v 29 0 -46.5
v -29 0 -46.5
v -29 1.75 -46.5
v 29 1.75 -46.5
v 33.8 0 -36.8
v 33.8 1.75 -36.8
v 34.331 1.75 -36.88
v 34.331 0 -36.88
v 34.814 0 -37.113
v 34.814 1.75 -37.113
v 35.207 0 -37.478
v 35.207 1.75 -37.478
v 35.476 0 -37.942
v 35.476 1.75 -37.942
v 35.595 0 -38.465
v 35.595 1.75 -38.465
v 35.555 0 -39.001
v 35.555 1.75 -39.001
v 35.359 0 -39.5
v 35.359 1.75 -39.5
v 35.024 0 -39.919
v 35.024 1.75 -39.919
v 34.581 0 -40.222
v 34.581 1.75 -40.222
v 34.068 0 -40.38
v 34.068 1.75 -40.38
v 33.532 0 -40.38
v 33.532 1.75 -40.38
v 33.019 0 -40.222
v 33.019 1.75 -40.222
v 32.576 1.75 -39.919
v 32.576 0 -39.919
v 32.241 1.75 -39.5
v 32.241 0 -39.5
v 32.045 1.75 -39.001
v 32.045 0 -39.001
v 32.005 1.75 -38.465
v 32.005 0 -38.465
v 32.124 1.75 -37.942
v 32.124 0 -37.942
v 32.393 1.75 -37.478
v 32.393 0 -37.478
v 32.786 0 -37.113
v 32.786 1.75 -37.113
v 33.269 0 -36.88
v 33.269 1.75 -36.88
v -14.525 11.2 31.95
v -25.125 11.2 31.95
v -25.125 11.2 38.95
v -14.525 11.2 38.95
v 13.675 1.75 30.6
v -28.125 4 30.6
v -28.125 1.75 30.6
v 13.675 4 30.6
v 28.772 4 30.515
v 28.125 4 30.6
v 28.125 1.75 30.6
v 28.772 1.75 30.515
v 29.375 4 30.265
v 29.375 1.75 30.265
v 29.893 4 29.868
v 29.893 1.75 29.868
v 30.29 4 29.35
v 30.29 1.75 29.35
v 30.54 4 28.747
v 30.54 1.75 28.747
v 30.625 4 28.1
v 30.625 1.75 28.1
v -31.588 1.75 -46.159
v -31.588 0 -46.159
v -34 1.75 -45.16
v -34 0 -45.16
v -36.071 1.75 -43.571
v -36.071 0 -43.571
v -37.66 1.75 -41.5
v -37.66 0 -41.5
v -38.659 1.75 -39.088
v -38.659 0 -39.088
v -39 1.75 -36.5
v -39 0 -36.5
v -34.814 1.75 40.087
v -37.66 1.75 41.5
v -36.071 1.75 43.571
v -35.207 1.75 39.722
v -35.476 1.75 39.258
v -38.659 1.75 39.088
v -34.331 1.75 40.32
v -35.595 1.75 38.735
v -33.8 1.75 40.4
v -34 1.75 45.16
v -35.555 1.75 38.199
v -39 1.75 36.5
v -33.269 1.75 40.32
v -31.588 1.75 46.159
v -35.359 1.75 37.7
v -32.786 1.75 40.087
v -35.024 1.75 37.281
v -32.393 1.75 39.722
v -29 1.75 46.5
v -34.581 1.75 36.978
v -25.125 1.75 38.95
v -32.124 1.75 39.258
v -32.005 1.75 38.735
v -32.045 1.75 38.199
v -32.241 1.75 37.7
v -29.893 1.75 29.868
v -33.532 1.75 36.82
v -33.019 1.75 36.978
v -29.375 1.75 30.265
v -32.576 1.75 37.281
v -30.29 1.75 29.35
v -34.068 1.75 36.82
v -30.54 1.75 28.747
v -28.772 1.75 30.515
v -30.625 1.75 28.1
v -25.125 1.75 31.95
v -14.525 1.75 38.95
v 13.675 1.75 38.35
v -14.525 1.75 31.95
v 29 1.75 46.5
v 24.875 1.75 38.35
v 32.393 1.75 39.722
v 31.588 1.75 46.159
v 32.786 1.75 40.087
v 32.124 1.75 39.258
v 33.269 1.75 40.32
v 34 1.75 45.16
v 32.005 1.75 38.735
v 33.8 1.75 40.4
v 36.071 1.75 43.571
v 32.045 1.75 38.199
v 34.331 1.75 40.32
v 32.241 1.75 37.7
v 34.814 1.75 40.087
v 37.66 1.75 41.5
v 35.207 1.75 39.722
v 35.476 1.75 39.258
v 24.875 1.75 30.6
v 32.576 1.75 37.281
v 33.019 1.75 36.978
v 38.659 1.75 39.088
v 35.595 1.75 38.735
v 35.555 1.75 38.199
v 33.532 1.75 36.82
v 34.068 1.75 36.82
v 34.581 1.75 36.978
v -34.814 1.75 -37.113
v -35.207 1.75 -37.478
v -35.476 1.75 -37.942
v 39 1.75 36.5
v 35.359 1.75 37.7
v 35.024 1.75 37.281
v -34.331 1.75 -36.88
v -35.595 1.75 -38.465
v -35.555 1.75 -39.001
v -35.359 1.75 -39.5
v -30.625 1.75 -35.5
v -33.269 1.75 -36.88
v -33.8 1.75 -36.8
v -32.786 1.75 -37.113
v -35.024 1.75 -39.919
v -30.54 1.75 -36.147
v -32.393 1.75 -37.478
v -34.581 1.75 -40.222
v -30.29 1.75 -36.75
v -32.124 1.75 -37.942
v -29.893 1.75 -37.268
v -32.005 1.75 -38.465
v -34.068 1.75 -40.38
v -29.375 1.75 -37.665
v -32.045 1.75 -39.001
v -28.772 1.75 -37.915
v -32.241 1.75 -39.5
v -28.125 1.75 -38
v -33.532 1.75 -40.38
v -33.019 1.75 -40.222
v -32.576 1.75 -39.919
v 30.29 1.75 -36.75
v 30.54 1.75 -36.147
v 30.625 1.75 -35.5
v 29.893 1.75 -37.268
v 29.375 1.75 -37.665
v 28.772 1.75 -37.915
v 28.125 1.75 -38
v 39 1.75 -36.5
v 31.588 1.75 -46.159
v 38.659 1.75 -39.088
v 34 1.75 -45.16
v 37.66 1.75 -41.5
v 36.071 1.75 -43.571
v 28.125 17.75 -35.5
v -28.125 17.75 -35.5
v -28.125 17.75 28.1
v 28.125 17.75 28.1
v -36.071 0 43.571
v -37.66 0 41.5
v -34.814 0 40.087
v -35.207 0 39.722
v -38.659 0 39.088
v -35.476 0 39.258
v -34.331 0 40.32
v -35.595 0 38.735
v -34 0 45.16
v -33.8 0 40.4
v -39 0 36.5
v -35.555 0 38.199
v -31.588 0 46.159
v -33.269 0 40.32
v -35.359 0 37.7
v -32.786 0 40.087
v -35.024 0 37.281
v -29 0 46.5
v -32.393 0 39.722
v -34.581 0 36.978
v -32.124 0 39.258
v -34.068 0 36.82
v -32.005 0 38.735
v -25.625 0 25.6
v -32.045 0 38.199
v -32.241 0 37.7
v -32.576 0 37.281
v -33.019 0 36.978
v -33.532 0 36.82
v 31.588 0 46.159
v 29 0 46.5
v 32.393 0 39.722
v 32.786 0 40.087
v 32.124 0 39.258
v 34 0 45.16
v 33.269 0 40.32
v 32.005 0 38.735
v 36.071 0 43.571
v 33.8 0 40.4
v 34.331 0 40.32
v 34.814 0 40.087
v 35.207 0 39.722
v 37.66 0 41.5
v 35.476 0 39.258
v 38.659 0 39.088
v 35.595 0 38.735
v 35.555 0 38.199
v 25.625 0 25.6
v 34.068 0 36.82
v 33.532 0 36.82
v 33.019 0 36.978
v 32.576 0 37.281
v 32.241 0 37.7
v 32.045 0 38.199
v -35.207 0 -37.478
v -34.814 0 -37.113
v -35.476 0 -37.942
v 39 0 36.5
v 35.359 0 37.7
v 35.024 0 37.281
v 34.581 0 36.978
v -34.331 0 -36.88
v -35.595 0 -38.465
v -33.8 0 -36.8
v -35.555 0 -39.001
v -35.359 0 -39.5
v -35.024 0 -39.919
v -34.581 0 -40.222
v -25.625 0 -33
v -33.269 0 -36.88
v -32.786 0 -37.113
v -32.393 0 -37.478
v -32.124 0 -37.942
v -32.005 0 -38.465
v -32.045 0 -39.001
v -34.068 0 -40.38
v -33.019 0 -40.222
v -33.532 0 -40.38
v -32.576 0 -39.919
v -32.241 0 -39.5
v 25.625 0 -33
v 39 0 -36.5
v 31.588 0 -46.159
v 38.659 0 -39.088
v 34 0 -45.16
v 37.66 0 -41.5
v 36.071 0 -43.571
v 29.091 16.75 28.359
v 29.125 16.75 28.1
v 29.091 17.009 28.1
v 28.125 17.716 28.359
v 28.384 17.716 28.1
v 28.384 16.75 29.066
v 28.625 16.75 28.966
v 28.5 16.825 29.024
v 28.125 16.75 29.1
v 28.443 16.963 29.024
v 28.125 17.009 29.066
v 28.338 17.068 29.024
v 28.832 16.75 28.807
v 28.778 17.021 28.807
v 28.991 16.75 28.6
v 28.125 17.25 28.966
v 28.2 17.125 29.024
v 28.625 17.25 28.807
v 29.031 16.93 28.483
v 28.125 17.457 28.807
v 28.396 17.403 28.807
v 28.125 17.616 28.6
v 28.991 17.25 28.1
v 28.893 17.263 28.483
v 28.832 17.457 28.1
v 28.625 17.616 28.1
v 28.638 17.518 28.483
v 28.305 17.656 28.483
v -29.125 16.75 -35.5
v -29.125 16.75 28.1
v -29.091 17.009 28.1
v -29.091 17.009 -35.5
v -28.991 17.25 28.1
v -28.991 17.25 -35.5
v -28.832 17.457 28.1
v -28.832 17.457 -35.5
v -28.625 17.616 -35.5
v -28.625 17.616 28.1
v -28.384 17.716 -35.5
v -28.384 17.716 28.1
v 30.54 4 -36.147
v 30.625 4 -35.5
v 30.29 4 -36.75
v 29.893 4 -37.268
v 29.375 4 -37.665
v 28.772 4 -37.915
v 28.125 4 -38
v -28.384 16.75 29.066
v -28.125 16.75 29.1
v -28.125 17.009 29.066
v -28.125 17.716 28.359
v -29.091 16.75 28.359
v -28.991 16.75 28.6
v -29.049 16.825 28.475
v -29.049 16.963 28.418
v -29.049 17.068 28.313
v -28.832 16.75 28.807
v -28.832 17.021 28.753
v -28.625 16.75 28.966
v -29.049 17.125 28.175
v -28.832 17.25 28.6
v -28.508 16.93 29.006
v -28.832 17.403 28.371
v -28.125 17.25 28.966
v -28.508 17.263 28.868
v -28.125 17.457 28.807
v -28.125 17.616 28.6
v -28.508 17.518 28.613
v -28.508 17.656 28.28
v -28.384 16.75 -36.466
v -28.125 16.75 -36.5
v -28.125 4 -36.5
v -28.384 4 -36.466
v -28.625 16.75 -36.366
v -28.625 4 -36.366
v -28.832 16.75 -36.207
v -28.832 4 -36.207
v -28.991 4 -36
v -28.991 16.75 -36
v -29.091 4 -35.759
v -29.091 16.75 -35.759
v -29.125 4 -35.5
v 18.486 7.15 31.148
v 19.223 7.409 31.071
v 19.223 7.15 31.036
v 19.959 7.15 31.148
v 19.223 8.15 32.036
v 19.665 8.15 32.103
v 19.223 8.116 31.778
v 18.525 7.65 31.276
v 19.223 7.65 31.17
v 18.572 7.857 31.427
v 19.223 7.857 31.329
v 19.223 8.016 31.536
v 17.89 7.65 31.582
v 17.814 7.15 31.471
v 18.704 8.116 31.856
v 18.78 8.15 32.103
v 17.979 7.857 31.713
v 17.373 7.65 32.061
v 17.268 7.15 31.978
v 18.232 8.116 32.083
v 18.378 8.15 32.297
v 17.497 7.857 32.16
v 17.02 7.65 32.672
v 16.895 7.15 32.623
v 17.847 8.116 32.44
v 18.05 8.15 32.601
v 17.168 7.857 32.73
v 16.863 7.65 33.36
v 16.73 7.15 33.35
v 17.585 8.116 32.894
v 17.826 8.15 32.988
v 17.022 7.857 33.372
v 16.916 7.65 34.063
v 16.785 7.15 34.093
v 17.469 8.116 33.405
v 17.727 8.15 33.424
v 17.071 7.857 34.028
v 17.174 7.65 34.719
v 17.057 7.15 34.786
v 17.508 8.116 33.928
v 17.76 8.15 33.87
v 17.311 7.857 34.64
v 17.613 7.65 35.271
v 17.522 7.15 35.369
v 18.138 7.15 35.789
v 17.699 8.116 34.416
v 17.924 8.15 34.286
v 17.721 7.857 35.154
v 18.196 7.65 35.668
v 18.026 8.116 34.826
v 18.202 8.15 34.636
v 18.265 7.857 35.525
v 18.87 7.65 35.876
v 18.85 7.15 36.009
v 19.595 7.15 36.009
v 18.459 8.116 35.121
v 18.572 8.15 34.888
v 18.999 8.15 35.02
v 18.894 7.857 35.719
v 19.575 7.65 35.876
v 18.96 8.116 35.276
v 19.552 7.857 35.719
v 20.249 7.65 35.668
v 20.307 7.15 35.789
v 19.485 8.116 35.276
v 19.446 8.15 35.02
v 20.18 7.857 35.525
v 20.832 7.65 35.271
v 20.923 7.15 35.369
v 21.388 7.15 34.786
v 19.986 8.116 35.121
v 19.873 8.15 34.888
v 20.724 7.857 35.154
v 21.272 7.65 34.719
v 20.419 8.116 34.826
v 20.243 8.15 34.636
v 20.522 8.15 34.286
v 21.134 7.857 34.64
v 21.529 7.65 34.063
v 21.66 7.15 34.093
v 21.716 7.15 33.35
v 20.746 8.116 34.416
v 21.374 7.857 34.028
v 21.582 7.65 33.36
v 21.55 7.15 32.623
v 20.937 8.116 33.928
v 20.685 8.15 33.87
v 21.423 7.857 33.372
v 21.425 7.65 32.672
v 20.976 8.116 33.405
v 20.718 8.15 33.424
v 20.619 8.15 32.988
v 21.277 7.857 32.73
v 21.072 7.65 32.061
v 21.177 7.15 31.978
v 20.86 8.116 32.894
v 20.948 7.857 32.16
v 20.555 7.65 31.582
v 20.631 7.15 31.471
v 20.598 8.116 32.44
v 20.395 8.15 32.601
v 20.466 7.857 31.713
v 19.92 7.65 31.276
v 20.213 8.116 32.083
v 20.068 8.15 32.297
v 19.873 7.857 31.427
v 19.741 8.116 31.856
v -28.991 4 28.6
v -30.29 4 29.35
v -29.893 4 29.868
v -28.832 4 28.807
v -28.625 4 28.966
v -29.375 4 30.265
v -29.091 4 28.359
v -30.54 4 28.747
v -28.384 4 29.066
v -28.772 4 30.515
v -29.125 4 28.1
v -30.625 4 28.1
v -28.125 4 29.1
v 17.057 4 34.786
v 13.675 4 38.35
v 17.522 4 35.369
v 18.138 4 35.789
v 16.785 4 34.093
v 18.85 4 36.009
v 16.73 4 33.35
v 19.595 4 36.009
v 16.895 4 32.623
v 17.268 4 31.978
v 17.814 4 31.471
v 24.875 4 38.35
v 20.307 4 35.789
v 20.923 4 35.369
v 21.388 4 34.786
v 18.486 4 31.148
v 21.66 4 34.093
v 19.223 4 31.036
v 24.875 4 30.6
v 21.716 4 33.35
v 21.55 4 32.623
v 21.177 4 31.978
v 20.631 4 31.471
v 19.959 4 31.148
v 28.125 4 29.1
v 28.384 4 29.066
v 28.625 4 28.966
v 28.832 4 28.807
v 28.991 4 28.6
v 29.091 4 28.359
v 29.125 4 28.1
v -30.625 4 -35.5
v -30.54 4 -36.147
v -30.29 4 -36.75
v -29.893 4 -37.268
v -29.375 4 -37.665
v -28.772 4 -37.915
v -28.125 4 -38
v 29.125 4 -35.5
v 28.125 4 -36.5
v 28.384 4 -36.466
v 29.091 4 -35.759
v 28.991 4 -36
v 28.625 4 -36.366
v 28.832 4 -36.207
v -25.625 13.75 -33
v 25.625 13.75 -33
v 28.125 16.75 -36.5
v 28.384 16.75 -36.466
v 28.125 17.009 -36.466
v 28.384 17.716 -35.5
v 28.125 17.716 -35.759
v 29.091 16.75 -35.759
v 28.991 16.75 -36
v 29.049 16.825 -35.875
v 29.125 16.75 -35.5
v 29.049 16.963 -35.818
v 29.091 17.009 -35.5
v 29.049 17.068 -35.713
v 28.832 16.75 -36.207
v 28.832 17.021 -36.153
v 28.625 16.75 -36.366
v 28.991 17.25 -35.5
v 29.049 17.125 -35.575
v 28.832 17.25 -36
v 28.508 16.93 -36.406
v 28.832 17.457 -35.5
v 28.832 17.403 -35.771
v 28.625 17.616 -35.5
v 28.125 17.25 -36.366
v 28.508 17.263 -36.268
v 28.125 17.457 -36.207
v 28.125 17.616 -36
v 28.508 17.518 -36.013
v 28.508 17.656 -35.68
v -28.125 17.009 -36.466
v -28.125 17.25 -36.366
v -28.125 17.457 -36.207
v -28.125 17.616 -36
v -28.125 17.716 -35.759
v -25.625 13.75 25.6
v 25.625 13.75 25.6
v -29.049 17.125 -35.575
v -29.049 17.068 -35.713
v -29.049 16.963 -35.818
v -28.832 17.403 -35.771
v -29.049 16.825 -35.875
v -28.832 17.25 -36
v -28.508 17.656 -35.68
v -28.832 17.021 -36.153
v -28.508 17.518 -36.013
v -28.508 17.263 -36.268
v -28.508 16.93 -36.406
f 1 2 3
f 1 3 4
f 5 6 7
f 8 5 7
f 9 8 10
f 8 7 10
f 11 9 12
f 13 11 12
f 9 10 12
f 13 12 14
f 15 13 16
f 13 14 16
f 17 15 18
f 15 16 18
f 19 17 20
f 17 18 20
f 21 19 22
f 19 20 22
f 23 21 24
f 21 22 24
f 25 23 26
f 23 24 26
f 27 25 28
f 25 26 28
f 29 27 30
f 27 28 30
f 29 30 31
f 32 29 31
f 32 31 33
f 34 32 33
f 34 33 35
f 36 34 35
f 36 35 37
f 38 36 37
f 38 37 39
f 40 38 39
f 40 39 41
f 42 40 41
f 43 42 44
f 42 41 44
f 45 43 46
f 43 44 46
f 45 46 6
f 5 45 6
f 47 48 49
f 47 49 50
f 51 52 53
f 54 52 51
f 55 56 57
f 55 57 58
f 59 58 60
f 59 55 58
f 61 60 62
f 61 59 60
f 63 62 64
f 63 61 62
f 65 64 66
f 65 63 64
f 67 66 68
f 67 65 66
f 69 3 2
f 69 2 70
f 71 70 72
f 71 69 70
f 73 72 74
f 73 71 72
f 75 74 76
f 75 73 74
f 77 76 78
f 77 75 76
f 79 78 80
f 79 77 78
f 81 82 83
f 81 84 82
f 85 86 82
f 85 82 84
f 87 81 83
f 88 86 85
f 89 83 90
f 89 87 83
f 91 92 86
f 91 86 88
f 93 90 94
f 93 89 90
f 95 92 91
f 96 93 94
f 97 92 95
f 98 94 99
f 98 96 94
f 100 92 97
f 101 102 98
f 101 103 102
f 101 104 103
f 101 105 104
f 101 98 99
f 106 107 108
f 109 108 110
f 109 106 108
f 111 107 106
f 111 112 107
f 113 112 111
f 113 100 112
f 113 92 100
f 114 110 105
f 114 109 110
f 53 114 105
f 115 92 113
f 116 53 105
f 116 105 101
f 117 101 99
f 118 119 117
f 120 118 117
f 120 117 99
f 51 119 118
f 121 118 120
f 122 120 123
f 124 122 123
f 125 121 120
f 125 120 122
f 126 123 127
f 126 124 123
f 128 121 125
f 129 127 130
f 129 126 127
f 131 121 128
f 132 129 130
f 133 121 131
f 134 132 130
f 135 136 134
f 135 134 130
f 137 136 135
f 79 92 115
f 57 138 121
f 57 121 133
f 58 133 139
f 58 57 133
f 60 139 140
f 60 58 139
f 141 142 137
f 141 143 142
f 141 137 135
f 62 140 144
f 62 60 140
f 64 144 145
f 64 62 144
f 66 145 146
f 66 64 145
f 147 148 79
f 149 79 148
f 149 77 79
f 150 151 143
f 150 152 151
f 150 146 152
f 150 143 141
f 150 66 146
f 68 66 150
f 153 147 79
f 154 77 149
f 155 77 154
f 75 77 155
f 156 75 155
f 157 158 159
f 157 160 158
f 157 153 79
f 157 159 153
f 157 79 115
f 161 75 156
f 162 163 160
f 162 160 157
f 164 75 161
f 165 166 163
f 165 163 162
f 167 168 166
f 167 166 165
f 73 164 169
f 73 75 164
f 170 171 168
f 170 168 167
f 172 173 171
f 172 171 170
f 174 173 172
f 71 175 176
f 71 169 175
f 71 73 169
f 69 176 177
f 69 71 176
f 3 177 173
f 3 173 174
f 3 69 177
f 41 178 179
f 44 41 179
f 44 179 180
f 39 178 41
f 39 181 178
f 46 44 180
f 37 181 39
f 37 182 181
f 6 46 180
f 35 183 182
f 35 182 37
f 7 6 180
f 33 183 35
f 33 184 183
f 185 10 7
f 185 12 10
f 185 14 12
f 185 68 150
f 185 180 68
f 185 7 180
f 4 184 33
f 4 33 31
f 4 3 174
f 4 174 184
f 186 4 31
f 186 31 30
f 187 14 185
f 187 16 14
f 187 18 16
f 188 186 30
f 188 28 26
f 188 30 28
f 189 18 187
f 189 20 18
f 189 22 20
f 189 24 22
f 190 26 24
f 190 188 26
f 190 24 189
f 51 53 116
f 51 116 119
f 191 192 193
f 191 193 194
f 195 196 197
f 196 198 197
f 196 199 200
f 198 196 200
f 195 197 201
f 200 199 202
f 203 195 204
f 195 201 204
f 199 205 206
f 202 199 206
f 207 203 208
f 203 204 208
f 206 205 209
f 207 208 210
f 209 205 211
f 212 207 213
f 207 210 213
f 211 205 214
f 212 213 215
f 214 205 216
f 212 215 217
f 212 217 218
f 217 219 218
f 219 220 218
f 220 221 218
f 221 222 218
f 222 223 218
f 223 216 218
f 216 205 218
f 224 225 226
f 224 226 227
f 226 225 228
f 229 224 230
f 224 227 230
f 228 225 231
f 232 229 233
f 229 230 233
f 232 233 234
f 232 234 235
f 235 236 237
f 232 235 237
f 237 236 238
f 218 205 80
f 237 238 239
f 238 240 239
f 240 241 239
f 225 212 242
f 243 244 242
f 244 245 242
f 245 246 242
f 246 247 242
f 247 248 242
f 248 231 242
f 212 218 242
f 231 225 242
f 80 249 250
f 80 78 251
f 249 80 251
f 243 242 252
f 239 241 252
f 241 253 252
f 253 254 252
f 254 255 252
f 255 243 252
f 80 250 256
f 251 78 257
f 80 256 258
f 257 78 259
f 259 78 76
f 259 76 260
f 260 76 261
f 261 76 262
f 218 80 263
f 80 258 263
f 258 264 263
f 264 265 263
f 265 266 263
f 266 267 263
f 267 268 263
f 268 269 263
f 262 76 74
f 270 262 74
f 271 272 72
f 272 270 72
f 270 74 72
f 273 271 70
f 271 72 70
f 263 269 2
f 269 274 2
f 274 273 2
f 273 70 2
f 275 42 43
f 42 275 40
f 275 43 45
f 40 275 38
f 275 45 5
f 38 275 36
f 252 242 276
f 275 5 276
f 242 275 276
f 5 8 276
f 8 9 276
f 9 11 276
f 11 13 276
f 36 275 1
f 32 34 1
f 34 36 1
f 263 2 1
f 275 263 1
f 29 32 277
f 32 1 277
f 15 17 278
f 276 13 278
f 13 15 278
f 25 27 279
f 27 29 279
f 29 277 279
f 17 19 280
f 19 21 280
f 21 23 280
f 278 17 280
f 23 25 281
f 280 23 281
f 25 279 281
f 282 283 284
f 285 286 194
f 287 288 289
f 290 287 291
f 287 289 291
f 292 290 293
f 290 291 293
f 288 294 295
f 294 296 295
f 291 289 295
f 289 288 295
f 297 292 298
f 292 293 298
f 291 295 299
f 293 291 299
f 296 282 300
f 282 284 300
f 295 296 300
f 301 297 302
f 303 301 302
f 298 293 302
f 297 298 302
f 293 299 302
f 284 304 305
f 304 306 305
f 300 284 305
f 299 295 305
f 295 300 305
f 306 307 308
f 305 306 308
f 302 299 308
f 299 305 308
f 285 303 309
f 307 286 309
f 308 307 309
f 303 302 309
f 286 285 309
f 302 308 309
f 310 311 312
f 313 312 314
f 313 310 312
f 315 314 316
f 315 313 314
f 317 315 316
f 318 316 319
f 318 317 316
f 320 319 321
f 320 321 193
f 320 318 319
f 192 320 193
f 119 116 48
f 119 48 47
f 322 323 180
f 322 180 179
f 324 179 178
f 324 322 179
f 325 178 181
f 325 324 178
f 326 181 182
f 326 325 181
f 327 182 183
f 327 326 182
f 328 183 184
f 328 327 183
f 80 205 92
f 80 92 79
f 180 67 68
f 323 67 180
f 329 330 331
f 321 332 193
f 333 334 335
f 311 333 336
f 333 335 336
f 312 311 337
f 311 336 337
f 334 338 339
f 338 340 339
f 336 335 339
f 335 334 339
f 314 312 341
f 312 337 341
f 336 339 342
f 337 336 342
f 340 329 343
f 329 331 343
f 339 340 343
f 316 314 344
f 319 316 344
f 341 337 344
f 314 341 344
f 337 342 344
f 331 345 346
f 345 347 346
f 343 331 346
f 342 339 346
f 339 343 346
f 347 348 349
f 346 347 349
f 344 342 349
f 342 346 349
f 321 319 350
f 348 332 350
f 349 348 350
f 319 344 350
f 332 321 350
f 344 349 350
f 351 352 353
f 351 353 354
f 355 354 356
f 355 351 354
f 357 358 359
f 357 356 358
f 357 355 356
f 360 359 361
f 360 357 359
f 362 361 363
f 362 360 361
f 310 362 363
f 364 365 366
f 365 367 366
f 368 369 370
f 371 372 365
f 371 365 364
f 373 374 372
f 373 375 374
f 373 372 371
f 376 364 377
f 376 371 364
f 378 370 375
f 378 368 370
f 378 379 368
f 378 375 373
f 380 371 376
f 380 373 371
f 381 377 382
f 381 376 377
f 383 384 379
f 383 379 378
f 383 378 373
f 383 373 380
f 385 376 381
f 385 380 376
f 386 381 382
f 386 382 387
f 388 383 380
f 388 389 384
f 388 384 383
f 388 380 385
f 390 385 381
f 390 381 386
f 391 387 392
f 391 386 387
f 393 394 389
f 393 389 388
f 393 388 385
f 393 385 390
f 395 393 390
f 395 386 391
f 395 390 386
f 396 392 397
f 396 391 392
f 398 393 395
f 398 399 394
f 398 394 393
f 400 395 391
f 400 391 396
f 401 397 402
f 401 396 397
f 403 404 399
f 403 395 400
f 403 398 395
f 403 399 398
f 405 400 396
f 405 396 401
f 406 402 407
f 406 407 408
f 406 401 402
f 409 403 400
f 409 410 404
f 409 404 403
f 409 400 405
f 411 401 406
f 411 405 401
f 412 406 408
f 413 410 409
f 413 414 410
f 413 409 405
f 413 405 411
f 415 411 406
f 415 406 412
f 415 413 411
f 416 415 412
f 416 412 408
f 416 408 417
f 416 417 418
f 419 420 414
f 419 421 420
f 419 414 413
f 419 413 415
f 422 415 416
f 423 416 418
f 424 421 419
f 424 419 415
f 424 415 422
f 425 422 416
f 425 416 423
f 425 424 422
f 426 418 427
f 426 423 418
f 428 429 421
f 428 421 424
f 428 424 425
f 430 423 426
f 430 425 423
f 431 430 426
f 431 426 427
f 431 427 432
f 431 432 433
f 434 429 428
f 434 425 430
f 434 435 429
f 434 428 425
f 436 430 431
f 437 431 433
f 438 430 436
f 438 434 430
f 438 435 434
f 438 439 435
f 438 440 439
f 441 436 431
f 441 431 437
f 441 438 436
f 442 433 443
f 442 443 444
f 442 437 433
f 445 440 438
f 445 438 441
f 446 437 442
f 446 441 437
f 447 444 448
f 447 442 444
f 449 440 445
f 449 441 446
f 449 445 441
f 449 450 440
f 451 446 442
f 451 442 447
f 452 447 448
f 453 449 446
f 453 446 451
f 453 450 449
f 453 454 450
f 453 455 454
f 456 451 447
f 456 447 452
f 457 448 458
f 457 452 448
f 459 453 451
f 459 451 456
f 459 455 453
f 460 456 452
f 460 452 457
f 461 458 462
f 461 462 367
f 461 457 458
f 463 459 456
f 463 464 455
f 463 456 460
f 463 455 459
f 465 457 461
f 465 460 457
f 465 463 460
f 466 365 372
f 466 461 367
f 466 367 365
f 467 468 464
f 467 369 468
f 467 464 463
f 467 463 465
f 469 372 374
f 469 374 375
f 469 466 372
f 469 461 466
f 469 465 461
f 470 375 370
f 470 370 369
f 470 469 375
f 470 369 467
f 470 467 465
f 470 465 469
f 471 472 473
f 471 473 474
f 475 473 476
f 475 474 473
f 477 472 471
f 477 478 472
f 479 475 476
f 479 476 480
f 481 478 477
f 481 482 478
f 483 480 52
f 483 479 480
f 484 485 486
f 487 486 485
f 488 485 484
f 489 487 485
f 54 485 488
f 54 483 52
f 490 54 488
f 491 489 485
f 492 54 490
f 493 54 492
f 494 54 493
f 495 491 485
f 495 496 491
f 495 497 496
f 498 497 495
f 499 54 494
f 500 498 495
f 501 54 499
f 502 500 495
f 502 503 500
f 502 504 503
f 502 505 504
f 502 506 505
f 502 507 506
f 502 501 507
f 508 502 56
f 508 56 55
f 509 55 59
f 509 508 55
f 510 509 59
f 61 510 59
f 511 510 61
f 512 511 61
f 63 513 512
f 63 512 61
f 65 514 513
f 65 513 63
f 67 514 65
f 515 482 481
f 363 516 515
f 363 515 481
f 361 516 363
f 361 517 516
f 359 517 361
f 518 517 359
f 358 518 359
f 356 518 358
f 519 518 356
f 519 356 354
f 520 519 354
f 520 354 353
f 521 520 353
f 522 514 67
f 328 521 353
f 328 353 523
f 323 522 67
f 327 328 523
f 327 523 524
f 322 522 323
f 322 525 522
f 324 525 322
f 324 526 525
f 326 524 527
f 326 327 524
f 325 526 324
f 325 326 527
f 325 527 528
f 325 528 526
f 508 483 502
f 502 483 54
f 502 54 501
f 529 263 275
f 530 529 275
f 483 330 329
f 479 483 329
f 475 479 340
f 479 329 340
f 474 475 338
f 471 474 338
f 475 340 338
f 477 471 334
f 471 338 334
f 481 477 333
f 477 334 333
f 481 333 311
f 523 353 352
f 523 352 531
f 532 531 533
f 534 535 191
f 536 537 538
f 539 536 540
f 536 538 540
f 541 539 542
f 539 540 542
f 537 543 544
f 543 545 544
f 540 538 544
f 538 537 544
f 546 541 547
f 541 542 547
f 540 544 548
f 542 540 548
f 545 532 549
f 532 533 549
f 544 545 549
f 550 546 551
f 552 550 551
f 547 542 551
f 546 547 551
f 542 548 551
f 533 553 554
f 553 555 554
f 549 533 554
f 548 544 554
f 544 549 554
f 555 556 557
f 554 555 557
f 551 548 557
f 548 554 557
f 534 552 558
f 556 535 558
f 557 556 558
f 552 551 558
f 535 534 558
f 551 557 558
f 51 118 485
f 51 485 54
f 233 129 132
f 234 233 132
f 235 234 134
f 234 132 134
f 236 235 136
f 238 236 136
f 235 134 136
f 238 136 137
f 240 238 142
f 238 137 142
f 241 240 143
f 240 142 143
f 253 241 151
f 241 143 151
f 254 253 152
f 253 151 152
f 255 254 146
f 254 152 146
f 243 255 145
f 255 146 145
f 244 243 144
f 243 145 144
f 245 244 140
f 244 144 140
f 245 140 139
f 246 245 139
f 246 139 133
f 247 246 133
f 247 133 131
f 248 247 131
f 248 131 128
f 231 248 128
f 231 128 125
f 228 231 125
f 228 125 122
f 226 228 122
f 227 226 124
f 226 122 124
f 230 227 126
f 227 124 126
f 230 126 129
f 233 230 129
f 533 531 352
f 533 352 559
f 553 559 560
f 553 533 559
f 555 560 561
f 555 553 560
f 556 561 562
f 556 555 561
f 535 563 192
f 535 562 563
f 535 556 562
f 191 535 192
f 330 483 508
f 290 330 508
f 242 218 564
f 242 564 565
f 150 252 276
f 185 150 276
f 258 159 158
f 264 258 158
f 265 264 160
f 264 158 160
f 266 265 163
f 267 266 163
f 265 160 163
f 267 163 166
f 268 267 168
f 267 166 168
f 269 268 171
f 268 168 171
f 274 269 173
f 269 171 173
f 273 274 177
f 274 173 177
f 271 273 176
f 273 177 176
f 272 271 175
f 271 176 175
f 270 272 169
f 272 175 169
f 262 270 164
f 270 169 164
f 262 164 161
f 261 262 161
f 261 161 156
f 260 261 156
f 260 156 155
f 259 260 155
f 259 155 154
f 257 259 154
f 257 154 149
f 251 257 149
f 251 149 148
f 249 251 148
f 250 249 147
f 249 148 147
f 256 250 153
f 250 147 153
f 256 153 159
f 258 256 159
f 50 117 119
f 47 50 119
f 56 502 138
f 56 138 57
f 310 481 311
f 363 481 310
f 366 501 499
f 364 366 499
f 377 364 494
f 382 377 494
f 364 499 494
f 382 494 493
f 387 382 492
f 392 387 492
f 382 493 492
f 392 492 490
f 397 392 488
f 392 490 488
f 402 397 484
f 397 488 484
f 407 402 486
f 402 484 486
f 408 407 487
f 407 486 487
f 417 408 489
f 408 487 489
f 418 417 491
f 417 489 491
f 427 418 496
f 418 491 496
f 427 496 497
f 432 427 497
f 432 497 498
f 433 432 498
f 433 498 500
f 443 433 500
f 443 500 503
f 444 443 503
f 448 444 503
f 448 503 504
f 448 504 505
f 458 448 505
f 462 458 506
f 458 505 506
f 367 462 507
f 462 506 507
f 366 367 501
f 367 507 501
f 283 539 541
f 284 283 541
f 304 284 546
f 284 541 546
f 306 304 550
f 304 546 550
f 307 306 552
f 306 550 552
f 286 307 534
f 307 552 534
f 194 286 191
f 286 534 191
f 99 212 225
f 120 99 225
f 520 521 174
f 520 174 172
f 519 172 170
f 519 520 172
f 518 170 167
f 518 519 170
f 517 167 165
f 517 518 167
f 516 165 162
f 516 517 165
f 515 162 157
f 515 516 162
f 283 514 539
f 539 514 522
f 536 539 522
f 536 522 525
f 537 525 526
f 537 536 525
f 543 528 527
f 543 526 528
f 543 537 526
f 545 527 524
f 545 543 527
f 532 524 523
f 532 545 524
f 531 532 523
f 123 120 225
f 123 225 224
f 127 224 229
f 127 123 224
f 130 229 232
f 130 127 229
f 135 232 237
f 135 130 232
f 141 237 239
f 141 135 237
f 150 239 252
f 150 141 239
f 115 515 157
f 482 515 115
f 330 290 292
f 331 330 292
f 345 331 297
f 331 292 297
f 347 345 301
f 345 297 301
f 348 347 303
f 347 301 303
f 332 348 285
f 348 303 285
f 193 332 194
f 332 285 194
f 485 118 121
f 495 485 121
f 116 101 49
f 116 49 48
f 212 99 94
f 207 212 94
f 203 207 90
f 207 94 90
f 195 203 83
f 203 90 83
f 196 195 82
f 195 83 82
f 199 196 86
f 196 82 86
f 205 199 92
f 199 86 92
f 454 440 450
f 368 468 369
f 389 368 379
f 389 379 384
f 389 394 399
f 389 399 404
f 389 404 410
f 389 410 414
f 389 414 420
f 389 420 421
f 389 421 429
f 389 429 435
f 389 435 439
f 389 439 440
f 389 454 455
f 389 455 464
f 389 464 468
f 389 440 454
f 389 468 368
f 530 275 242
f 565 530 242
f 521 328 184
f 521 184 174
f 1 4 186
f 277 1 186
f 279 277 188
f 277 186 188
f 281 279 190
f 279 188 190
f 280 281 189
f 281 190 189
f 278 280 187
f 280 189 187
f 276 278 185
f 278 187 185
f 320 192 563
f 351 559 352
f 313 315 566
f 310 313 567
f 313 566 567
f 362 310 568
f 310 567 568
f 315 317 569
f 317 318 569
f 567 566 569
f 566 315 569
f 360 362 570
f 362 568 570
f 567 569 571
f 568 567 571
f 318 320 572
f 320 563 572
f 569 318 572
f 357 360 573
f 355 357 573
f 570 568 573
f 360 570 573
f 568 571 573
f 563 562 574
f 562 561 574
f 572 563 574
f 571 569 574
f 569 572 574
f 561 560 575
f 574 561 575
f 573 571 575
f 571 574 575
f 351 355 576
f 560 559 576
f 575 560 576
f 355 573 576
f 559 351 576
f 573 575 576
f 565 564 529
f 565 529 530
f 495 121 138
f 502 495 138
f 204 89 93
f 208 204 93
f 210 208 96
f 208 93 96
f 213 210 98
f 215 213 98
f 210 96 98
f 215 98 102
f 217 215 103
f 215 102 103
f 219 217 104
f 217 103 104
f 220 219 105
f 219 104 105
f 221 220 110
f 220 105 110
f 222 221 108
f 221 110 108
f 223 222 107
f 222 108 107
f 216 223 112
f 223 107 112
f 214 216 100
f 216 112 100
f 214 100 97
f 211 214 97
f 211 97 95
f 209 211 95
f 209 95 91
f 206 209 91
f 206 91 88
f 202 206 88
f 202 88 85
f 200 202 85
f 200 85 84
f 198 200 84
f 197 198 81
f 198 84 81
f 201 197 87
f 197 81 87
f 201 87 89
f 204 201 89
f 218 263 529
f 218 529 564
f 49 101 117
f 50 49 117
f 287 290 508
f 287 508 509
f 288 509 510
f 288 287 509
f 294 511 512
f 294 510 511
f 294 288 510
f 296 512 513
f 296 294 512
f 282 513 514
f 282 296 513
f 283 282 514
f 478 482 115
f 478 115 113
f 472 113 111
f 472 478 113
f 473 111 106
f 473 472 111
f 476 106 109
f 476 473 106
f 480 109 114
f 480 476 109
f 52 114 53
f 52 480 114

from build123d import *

# Parameters (mm, degrees)
SKETCH1_W           = 78
SKETCH1_H           = 93
BOSS_EXTRUDE1_DEPTH = 1.75
SKETCH2_R           = 1.8
CUT_EXTRUDE1_DEPTH  = 1.75
SKETCH3_W           = 58.25
SKETCH3_H           = 65.6
BOSS_EXTRUDE2_DEPTH = 16
FILLET1_R           = 1
SKETCH4_W           = 10.6
SKETCH4_H           = 7
BOSS_EXTRUDE3_DEPTH = 9.45
BOSS_EXTRUDE4_START = 2.25
BOSS_EXTRUDE4_DEPTH = 2.25
SKETCH6_W           = 11.2
SKETCH6_H           = 7.75
BOSS_EXTRUDE5_DEPTH = 2.25
SKETCH7_W           = 51.25
SKETCH7_H           = 58.6
CUT_EXTRUDE2_DEPTH  = 13.75
SKETCH8_R           = 2.5
BOSS_EXTRUDE6_DEPTH = 4.15
FILLET2_R           = 1


with BuildPart() as part:
    # Sketch1 → Boss-Extrude1 (new body)
    with BuildSketch(Plane(origin=(0, 0, 0), x_dir=(1, 0, 0), z_dir=(0, 1, 0))):
        Rectangle(SKETCH1_W, SKETCH1_H)
    extrude(amount=BOSS_EXTRUDE1_DEPTH)

    # Sketch2 → Cut-Extrude1 (cut)
    with BuildSketch(Plane(origin=(0, 1.75, 0), x_dir=(1, 0, 0), z_dir=(0, 1, 0))):
        with Locations(Location((-33.8, 38.6, 0), (0, 0, 270))):
            Circle(SKETCH2_R)
        with Locations(Location((33.8, 38.6, 0), (0, 0, 270))):
            Circle(SKETCH2_R)
        with Locations(Location((33.8, -38.6, 0), (0, 0, 270))):
            Circle(SKETCH2_R)
        with Locations(Location((-33.8, -38.6, 0), (0, 0, 270))):
            Circle(SKETCH2_R)
        with BuildLine():
            Line((-39, 36.5), (-39, 46.5))
            Line((-39, 46.5), (-29, 46.5))
            ThreePointArc((-29, 46.5), (-36.071067812, 43.571067812), (-39, 36.5))
        make_face()
        with BuildLine():
            Line((39, 36.5), (39, 46.5))
            Line((39, 46.5), (29, 46.5))
            ThreePointArc((29, 46.5), (36.071067812, 43.571067812), (39, 36.5))
        make_face()
        with BuildLine():
            Line((39, -36.5), (39, -46.5))
            Line((39, -46.5), (29, -46.5))
            ThreePointArc((29, -46.5), (36.071067812, -43.571067812), (39, -36.5))
        make_face()
        with BuildLine():
            Line((-39, -36.5), (-39, -46.5))
            Line((-39, -46.5), (-29, -46.5))
            ThreePointArc((-29, -46.5), (-36.071067812, -43.571067812), (-39, -36.5))
        make_face()
    extrude(amount=-CUT_EXTRUDE1_DEPTH, mode=Mode.SUBTRACT)

    # Sketch3 → Boss-Extrude2 (add)
    with BuildSketch(Plane(origin=(0, 1.75, 0), x_dir=(1, 0, 0), z_dir=(0, 1, 0))):
        with Locations((0, 3.7)):
            Rectangle(SKETCH3_W, SKETCH3_H)
    extrude(amount=BOSS_EXTRUDE2_DEPTH)

    # Fillet1
    fillet1_edges = [part.edges().sort_by_distance(p)[0] for p in [
        (0, 17.75, -36.5),
        (29.125, 9.75, -36.5),
        (29.125, 17.75, -3.7),
        (29.125, 9.75, 29.1),
        (0, 17.75, 29.1),
        (-29.125, 9.75, 29.1),
        (-29.125, 17.75, -3.7),
        (-29.125, 9.75, -36.5),
    ]]
    fillet(fillet1_edges, radius=FILLET1_R)

    # Sketch4 → Boss-Extrude3 (add)
    with BuildSketch(Plane(origin=(0, 1.75, 0), x_dir=(1, 0, 0), z_dir=(0, 1, 0))):
        with Locations((-19.825, -35.45)):
            Rectangle(SKETCH4_W, SKETCH4_H)
    extrude(amount=BOSS_EXTRUDE3_DEPTH)

    # Sketch5 → Boss-Extrude4 (add)
    with BuildSketch(Plane(origin=(0, 1.75, 0), x_dir=(1, 0, 0), z_dir=(0, 1, 0)).offset(BOSS_EXTRUDE4_START)):
        with BuildLine():
            Line((-28.125, -30.6), (28.125, -30.6))
            ThreePointArc((28.125, -30.6), (29.892766953, -29.867766953), (30.625, -28.1))
            Line((30.625, -28.1), (30.625, 35.5))
            ThreePointArc((30.625, 35.5), (29.892766953, 37.267766953), (28.125, 38))
            Line((28.125, 38), (-28.125, 38))
            ThreePointArc((-28.125, 38), (-29.892766953, 37.267766953), (-30.625, 35.5))
            Line((-30.625, 35.5), (-30.625, -28.1))
            ThreePointArc((-30.625, -28.1), (-29.892766953, -29.867766953), (-28.125, -30.6))
        make_face()
        with BuildLine():
            ThreePointArc((-29.125, 35.5), (-28.832106781, 36.207106781), (-28.125, 36.5))
            Line((-28.125, 36.5), (28.125, 36.5))
            ThreePointArc((28.125, 36.5), (28.832106781, 36.207106781), (29.125, 35.5))
            Line((29.125, 35.5), (29.125, -28.1))
            ThreePointArc((29.125, -28.1), (28.832106781, -28.807106781), (28.125, -29.1))
            Line((28.125, -29.1), (-28.125, -29.1))
            ThreePointArc((-28.125, -29.1), (-28.832106781, -28.807106781), (-29.125, -28.1))
            Line((-29.125, -28.1), (-29.125, 35.5))
        make_face(mode=Mode.SUBTRACT)
    extrude(amount=-BOSS_EXTRUDE4_DEPTH)

    # Sketch6 → Boss-Extrude5 (add)
    with BuildSketch(Plane(origin=(0, 1.75, 0), x_dir=(1, 0, 0), z_dir=(0, 1, 0))):
        with Locations((19.275, -34.475)):
            Rectangle(SKETCH6_W, SKETCH6_H)
    extrude(amount=BOSS_EXTRUDE5_DEPTH)

    # Sketch7 → Cut-Extrude2 (cut)
    with BuildSketch(Plane.XZ):
        with Locations((0, -3.7)):
            Rectangle(SKETCH7_W, SKETCH7_H)
    extrude(amount=-CUT_EXTRUDE2_DEPTH, mode=Mode.SUBTRACT)

    # Sketch8 → Boss-Extrude6 (add)
    with BuildSketch(Plane(origin=(0, 4, 0), x_dir=(1, 0, 0), z_dir=(0, 1, 0))):
        with Locations(Location((19.222552854, -33.536468805, 0), (0, 0, 90))):
            Circle(SKETCH8_R)
    extrude(amount=BOSS_EXTRUDE6_DEPTH)

    # Fillet2
    fillet2_edges = [part.edges().sort_by_distance(p)[0] for p in [
        (19.222552854, 8.15, 36.036468805),
    ]]
    fillet(fillet2_edges, radius=FILLET2_R)


solid = part.part
